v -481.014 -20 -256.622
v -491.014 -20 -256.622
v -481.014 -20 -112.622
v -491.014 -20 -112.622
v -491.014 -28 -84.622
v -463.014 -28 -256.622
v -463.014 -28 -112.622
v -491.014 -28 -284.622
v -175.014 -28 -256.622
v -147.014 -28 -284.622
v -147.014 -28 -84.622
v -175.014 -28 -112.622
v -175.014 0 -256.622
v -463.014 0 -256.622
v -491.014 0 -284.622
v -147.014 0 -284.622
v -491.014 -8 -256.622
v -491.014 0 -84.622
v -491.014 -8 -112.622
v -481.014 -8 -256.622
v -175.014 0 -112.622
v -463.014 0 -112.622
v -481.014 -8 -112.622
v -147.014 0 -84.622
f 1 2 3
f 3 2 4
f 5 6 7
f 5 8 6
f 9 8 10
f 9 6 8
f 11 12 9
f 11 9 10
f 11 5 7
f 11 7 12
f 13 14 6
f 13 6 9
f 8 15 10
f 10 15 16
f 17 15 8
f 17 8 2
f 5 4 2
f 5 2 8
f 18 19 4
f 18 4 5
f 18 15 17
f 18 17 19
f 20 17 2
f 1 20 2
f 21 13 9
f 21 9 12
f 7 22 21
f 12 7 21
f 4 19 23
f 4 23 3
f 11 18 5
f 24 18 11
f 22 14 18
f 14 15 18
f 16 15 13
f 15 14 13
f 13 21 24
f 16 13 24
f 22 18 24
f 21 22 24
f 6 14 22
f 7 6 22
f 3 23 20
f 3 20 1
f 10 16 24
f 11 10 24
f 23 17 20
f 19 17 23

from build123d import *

# Parameters (mm, degrees)
F0_W          = 860
F0_H          = 500
F0_W_2        = 720
F0_H_2        = 360
F1_DEPTH      = 70
F3_W          = 30
F3_H          = 360
F4_DEPTH      = 25
F4_DEPTH_BACK = 25
F5_SCALE      = 0.4


# Not quite as in the source:
# - a feature names something its author has since deleted; it is built from what else it names


with BuildPart() as f1:
    # F0 (on Front) → F1 (new body)
    with BuildSketch(Plane.XZ):
        with Locations((-61.0144731402, -34.6215157021)):
            Rectangle(F0_W, F0_H)
        with Locations((-61.0144731402, -34.6215157021)):
            Rectangle(F0_W_2, F0_H_2, mode=Mode.SUBTRACT)
    extrude(amount=F1_DEPTH)

    # F3 (on face) → F4 (cut, two sides)
    with BuildSketch(Plane(origin=(-491.0144731402, 0, 0), x_dir=(0, -1, 0), z_dir=(-1, 0, 0))) as f4_sk:
        with Locations((35, -34.6215157021)):
            Rectangle(F3_W, F3_H)
    extrude(amount=F4_DEPTH, mode=Mode.SUBTRACT)
    extrude(f4_sk.sketch, amount=-F4_DEPTH_BACK, mode=Mode.SUBTRACT)


with BuildPart() as f1_1:
    # F5: moved
    add(f1.part.scale(F5_SCALE).moved(Location((-294.6086838841, 0, -170.7729094213))))


solid = f1_1.part
